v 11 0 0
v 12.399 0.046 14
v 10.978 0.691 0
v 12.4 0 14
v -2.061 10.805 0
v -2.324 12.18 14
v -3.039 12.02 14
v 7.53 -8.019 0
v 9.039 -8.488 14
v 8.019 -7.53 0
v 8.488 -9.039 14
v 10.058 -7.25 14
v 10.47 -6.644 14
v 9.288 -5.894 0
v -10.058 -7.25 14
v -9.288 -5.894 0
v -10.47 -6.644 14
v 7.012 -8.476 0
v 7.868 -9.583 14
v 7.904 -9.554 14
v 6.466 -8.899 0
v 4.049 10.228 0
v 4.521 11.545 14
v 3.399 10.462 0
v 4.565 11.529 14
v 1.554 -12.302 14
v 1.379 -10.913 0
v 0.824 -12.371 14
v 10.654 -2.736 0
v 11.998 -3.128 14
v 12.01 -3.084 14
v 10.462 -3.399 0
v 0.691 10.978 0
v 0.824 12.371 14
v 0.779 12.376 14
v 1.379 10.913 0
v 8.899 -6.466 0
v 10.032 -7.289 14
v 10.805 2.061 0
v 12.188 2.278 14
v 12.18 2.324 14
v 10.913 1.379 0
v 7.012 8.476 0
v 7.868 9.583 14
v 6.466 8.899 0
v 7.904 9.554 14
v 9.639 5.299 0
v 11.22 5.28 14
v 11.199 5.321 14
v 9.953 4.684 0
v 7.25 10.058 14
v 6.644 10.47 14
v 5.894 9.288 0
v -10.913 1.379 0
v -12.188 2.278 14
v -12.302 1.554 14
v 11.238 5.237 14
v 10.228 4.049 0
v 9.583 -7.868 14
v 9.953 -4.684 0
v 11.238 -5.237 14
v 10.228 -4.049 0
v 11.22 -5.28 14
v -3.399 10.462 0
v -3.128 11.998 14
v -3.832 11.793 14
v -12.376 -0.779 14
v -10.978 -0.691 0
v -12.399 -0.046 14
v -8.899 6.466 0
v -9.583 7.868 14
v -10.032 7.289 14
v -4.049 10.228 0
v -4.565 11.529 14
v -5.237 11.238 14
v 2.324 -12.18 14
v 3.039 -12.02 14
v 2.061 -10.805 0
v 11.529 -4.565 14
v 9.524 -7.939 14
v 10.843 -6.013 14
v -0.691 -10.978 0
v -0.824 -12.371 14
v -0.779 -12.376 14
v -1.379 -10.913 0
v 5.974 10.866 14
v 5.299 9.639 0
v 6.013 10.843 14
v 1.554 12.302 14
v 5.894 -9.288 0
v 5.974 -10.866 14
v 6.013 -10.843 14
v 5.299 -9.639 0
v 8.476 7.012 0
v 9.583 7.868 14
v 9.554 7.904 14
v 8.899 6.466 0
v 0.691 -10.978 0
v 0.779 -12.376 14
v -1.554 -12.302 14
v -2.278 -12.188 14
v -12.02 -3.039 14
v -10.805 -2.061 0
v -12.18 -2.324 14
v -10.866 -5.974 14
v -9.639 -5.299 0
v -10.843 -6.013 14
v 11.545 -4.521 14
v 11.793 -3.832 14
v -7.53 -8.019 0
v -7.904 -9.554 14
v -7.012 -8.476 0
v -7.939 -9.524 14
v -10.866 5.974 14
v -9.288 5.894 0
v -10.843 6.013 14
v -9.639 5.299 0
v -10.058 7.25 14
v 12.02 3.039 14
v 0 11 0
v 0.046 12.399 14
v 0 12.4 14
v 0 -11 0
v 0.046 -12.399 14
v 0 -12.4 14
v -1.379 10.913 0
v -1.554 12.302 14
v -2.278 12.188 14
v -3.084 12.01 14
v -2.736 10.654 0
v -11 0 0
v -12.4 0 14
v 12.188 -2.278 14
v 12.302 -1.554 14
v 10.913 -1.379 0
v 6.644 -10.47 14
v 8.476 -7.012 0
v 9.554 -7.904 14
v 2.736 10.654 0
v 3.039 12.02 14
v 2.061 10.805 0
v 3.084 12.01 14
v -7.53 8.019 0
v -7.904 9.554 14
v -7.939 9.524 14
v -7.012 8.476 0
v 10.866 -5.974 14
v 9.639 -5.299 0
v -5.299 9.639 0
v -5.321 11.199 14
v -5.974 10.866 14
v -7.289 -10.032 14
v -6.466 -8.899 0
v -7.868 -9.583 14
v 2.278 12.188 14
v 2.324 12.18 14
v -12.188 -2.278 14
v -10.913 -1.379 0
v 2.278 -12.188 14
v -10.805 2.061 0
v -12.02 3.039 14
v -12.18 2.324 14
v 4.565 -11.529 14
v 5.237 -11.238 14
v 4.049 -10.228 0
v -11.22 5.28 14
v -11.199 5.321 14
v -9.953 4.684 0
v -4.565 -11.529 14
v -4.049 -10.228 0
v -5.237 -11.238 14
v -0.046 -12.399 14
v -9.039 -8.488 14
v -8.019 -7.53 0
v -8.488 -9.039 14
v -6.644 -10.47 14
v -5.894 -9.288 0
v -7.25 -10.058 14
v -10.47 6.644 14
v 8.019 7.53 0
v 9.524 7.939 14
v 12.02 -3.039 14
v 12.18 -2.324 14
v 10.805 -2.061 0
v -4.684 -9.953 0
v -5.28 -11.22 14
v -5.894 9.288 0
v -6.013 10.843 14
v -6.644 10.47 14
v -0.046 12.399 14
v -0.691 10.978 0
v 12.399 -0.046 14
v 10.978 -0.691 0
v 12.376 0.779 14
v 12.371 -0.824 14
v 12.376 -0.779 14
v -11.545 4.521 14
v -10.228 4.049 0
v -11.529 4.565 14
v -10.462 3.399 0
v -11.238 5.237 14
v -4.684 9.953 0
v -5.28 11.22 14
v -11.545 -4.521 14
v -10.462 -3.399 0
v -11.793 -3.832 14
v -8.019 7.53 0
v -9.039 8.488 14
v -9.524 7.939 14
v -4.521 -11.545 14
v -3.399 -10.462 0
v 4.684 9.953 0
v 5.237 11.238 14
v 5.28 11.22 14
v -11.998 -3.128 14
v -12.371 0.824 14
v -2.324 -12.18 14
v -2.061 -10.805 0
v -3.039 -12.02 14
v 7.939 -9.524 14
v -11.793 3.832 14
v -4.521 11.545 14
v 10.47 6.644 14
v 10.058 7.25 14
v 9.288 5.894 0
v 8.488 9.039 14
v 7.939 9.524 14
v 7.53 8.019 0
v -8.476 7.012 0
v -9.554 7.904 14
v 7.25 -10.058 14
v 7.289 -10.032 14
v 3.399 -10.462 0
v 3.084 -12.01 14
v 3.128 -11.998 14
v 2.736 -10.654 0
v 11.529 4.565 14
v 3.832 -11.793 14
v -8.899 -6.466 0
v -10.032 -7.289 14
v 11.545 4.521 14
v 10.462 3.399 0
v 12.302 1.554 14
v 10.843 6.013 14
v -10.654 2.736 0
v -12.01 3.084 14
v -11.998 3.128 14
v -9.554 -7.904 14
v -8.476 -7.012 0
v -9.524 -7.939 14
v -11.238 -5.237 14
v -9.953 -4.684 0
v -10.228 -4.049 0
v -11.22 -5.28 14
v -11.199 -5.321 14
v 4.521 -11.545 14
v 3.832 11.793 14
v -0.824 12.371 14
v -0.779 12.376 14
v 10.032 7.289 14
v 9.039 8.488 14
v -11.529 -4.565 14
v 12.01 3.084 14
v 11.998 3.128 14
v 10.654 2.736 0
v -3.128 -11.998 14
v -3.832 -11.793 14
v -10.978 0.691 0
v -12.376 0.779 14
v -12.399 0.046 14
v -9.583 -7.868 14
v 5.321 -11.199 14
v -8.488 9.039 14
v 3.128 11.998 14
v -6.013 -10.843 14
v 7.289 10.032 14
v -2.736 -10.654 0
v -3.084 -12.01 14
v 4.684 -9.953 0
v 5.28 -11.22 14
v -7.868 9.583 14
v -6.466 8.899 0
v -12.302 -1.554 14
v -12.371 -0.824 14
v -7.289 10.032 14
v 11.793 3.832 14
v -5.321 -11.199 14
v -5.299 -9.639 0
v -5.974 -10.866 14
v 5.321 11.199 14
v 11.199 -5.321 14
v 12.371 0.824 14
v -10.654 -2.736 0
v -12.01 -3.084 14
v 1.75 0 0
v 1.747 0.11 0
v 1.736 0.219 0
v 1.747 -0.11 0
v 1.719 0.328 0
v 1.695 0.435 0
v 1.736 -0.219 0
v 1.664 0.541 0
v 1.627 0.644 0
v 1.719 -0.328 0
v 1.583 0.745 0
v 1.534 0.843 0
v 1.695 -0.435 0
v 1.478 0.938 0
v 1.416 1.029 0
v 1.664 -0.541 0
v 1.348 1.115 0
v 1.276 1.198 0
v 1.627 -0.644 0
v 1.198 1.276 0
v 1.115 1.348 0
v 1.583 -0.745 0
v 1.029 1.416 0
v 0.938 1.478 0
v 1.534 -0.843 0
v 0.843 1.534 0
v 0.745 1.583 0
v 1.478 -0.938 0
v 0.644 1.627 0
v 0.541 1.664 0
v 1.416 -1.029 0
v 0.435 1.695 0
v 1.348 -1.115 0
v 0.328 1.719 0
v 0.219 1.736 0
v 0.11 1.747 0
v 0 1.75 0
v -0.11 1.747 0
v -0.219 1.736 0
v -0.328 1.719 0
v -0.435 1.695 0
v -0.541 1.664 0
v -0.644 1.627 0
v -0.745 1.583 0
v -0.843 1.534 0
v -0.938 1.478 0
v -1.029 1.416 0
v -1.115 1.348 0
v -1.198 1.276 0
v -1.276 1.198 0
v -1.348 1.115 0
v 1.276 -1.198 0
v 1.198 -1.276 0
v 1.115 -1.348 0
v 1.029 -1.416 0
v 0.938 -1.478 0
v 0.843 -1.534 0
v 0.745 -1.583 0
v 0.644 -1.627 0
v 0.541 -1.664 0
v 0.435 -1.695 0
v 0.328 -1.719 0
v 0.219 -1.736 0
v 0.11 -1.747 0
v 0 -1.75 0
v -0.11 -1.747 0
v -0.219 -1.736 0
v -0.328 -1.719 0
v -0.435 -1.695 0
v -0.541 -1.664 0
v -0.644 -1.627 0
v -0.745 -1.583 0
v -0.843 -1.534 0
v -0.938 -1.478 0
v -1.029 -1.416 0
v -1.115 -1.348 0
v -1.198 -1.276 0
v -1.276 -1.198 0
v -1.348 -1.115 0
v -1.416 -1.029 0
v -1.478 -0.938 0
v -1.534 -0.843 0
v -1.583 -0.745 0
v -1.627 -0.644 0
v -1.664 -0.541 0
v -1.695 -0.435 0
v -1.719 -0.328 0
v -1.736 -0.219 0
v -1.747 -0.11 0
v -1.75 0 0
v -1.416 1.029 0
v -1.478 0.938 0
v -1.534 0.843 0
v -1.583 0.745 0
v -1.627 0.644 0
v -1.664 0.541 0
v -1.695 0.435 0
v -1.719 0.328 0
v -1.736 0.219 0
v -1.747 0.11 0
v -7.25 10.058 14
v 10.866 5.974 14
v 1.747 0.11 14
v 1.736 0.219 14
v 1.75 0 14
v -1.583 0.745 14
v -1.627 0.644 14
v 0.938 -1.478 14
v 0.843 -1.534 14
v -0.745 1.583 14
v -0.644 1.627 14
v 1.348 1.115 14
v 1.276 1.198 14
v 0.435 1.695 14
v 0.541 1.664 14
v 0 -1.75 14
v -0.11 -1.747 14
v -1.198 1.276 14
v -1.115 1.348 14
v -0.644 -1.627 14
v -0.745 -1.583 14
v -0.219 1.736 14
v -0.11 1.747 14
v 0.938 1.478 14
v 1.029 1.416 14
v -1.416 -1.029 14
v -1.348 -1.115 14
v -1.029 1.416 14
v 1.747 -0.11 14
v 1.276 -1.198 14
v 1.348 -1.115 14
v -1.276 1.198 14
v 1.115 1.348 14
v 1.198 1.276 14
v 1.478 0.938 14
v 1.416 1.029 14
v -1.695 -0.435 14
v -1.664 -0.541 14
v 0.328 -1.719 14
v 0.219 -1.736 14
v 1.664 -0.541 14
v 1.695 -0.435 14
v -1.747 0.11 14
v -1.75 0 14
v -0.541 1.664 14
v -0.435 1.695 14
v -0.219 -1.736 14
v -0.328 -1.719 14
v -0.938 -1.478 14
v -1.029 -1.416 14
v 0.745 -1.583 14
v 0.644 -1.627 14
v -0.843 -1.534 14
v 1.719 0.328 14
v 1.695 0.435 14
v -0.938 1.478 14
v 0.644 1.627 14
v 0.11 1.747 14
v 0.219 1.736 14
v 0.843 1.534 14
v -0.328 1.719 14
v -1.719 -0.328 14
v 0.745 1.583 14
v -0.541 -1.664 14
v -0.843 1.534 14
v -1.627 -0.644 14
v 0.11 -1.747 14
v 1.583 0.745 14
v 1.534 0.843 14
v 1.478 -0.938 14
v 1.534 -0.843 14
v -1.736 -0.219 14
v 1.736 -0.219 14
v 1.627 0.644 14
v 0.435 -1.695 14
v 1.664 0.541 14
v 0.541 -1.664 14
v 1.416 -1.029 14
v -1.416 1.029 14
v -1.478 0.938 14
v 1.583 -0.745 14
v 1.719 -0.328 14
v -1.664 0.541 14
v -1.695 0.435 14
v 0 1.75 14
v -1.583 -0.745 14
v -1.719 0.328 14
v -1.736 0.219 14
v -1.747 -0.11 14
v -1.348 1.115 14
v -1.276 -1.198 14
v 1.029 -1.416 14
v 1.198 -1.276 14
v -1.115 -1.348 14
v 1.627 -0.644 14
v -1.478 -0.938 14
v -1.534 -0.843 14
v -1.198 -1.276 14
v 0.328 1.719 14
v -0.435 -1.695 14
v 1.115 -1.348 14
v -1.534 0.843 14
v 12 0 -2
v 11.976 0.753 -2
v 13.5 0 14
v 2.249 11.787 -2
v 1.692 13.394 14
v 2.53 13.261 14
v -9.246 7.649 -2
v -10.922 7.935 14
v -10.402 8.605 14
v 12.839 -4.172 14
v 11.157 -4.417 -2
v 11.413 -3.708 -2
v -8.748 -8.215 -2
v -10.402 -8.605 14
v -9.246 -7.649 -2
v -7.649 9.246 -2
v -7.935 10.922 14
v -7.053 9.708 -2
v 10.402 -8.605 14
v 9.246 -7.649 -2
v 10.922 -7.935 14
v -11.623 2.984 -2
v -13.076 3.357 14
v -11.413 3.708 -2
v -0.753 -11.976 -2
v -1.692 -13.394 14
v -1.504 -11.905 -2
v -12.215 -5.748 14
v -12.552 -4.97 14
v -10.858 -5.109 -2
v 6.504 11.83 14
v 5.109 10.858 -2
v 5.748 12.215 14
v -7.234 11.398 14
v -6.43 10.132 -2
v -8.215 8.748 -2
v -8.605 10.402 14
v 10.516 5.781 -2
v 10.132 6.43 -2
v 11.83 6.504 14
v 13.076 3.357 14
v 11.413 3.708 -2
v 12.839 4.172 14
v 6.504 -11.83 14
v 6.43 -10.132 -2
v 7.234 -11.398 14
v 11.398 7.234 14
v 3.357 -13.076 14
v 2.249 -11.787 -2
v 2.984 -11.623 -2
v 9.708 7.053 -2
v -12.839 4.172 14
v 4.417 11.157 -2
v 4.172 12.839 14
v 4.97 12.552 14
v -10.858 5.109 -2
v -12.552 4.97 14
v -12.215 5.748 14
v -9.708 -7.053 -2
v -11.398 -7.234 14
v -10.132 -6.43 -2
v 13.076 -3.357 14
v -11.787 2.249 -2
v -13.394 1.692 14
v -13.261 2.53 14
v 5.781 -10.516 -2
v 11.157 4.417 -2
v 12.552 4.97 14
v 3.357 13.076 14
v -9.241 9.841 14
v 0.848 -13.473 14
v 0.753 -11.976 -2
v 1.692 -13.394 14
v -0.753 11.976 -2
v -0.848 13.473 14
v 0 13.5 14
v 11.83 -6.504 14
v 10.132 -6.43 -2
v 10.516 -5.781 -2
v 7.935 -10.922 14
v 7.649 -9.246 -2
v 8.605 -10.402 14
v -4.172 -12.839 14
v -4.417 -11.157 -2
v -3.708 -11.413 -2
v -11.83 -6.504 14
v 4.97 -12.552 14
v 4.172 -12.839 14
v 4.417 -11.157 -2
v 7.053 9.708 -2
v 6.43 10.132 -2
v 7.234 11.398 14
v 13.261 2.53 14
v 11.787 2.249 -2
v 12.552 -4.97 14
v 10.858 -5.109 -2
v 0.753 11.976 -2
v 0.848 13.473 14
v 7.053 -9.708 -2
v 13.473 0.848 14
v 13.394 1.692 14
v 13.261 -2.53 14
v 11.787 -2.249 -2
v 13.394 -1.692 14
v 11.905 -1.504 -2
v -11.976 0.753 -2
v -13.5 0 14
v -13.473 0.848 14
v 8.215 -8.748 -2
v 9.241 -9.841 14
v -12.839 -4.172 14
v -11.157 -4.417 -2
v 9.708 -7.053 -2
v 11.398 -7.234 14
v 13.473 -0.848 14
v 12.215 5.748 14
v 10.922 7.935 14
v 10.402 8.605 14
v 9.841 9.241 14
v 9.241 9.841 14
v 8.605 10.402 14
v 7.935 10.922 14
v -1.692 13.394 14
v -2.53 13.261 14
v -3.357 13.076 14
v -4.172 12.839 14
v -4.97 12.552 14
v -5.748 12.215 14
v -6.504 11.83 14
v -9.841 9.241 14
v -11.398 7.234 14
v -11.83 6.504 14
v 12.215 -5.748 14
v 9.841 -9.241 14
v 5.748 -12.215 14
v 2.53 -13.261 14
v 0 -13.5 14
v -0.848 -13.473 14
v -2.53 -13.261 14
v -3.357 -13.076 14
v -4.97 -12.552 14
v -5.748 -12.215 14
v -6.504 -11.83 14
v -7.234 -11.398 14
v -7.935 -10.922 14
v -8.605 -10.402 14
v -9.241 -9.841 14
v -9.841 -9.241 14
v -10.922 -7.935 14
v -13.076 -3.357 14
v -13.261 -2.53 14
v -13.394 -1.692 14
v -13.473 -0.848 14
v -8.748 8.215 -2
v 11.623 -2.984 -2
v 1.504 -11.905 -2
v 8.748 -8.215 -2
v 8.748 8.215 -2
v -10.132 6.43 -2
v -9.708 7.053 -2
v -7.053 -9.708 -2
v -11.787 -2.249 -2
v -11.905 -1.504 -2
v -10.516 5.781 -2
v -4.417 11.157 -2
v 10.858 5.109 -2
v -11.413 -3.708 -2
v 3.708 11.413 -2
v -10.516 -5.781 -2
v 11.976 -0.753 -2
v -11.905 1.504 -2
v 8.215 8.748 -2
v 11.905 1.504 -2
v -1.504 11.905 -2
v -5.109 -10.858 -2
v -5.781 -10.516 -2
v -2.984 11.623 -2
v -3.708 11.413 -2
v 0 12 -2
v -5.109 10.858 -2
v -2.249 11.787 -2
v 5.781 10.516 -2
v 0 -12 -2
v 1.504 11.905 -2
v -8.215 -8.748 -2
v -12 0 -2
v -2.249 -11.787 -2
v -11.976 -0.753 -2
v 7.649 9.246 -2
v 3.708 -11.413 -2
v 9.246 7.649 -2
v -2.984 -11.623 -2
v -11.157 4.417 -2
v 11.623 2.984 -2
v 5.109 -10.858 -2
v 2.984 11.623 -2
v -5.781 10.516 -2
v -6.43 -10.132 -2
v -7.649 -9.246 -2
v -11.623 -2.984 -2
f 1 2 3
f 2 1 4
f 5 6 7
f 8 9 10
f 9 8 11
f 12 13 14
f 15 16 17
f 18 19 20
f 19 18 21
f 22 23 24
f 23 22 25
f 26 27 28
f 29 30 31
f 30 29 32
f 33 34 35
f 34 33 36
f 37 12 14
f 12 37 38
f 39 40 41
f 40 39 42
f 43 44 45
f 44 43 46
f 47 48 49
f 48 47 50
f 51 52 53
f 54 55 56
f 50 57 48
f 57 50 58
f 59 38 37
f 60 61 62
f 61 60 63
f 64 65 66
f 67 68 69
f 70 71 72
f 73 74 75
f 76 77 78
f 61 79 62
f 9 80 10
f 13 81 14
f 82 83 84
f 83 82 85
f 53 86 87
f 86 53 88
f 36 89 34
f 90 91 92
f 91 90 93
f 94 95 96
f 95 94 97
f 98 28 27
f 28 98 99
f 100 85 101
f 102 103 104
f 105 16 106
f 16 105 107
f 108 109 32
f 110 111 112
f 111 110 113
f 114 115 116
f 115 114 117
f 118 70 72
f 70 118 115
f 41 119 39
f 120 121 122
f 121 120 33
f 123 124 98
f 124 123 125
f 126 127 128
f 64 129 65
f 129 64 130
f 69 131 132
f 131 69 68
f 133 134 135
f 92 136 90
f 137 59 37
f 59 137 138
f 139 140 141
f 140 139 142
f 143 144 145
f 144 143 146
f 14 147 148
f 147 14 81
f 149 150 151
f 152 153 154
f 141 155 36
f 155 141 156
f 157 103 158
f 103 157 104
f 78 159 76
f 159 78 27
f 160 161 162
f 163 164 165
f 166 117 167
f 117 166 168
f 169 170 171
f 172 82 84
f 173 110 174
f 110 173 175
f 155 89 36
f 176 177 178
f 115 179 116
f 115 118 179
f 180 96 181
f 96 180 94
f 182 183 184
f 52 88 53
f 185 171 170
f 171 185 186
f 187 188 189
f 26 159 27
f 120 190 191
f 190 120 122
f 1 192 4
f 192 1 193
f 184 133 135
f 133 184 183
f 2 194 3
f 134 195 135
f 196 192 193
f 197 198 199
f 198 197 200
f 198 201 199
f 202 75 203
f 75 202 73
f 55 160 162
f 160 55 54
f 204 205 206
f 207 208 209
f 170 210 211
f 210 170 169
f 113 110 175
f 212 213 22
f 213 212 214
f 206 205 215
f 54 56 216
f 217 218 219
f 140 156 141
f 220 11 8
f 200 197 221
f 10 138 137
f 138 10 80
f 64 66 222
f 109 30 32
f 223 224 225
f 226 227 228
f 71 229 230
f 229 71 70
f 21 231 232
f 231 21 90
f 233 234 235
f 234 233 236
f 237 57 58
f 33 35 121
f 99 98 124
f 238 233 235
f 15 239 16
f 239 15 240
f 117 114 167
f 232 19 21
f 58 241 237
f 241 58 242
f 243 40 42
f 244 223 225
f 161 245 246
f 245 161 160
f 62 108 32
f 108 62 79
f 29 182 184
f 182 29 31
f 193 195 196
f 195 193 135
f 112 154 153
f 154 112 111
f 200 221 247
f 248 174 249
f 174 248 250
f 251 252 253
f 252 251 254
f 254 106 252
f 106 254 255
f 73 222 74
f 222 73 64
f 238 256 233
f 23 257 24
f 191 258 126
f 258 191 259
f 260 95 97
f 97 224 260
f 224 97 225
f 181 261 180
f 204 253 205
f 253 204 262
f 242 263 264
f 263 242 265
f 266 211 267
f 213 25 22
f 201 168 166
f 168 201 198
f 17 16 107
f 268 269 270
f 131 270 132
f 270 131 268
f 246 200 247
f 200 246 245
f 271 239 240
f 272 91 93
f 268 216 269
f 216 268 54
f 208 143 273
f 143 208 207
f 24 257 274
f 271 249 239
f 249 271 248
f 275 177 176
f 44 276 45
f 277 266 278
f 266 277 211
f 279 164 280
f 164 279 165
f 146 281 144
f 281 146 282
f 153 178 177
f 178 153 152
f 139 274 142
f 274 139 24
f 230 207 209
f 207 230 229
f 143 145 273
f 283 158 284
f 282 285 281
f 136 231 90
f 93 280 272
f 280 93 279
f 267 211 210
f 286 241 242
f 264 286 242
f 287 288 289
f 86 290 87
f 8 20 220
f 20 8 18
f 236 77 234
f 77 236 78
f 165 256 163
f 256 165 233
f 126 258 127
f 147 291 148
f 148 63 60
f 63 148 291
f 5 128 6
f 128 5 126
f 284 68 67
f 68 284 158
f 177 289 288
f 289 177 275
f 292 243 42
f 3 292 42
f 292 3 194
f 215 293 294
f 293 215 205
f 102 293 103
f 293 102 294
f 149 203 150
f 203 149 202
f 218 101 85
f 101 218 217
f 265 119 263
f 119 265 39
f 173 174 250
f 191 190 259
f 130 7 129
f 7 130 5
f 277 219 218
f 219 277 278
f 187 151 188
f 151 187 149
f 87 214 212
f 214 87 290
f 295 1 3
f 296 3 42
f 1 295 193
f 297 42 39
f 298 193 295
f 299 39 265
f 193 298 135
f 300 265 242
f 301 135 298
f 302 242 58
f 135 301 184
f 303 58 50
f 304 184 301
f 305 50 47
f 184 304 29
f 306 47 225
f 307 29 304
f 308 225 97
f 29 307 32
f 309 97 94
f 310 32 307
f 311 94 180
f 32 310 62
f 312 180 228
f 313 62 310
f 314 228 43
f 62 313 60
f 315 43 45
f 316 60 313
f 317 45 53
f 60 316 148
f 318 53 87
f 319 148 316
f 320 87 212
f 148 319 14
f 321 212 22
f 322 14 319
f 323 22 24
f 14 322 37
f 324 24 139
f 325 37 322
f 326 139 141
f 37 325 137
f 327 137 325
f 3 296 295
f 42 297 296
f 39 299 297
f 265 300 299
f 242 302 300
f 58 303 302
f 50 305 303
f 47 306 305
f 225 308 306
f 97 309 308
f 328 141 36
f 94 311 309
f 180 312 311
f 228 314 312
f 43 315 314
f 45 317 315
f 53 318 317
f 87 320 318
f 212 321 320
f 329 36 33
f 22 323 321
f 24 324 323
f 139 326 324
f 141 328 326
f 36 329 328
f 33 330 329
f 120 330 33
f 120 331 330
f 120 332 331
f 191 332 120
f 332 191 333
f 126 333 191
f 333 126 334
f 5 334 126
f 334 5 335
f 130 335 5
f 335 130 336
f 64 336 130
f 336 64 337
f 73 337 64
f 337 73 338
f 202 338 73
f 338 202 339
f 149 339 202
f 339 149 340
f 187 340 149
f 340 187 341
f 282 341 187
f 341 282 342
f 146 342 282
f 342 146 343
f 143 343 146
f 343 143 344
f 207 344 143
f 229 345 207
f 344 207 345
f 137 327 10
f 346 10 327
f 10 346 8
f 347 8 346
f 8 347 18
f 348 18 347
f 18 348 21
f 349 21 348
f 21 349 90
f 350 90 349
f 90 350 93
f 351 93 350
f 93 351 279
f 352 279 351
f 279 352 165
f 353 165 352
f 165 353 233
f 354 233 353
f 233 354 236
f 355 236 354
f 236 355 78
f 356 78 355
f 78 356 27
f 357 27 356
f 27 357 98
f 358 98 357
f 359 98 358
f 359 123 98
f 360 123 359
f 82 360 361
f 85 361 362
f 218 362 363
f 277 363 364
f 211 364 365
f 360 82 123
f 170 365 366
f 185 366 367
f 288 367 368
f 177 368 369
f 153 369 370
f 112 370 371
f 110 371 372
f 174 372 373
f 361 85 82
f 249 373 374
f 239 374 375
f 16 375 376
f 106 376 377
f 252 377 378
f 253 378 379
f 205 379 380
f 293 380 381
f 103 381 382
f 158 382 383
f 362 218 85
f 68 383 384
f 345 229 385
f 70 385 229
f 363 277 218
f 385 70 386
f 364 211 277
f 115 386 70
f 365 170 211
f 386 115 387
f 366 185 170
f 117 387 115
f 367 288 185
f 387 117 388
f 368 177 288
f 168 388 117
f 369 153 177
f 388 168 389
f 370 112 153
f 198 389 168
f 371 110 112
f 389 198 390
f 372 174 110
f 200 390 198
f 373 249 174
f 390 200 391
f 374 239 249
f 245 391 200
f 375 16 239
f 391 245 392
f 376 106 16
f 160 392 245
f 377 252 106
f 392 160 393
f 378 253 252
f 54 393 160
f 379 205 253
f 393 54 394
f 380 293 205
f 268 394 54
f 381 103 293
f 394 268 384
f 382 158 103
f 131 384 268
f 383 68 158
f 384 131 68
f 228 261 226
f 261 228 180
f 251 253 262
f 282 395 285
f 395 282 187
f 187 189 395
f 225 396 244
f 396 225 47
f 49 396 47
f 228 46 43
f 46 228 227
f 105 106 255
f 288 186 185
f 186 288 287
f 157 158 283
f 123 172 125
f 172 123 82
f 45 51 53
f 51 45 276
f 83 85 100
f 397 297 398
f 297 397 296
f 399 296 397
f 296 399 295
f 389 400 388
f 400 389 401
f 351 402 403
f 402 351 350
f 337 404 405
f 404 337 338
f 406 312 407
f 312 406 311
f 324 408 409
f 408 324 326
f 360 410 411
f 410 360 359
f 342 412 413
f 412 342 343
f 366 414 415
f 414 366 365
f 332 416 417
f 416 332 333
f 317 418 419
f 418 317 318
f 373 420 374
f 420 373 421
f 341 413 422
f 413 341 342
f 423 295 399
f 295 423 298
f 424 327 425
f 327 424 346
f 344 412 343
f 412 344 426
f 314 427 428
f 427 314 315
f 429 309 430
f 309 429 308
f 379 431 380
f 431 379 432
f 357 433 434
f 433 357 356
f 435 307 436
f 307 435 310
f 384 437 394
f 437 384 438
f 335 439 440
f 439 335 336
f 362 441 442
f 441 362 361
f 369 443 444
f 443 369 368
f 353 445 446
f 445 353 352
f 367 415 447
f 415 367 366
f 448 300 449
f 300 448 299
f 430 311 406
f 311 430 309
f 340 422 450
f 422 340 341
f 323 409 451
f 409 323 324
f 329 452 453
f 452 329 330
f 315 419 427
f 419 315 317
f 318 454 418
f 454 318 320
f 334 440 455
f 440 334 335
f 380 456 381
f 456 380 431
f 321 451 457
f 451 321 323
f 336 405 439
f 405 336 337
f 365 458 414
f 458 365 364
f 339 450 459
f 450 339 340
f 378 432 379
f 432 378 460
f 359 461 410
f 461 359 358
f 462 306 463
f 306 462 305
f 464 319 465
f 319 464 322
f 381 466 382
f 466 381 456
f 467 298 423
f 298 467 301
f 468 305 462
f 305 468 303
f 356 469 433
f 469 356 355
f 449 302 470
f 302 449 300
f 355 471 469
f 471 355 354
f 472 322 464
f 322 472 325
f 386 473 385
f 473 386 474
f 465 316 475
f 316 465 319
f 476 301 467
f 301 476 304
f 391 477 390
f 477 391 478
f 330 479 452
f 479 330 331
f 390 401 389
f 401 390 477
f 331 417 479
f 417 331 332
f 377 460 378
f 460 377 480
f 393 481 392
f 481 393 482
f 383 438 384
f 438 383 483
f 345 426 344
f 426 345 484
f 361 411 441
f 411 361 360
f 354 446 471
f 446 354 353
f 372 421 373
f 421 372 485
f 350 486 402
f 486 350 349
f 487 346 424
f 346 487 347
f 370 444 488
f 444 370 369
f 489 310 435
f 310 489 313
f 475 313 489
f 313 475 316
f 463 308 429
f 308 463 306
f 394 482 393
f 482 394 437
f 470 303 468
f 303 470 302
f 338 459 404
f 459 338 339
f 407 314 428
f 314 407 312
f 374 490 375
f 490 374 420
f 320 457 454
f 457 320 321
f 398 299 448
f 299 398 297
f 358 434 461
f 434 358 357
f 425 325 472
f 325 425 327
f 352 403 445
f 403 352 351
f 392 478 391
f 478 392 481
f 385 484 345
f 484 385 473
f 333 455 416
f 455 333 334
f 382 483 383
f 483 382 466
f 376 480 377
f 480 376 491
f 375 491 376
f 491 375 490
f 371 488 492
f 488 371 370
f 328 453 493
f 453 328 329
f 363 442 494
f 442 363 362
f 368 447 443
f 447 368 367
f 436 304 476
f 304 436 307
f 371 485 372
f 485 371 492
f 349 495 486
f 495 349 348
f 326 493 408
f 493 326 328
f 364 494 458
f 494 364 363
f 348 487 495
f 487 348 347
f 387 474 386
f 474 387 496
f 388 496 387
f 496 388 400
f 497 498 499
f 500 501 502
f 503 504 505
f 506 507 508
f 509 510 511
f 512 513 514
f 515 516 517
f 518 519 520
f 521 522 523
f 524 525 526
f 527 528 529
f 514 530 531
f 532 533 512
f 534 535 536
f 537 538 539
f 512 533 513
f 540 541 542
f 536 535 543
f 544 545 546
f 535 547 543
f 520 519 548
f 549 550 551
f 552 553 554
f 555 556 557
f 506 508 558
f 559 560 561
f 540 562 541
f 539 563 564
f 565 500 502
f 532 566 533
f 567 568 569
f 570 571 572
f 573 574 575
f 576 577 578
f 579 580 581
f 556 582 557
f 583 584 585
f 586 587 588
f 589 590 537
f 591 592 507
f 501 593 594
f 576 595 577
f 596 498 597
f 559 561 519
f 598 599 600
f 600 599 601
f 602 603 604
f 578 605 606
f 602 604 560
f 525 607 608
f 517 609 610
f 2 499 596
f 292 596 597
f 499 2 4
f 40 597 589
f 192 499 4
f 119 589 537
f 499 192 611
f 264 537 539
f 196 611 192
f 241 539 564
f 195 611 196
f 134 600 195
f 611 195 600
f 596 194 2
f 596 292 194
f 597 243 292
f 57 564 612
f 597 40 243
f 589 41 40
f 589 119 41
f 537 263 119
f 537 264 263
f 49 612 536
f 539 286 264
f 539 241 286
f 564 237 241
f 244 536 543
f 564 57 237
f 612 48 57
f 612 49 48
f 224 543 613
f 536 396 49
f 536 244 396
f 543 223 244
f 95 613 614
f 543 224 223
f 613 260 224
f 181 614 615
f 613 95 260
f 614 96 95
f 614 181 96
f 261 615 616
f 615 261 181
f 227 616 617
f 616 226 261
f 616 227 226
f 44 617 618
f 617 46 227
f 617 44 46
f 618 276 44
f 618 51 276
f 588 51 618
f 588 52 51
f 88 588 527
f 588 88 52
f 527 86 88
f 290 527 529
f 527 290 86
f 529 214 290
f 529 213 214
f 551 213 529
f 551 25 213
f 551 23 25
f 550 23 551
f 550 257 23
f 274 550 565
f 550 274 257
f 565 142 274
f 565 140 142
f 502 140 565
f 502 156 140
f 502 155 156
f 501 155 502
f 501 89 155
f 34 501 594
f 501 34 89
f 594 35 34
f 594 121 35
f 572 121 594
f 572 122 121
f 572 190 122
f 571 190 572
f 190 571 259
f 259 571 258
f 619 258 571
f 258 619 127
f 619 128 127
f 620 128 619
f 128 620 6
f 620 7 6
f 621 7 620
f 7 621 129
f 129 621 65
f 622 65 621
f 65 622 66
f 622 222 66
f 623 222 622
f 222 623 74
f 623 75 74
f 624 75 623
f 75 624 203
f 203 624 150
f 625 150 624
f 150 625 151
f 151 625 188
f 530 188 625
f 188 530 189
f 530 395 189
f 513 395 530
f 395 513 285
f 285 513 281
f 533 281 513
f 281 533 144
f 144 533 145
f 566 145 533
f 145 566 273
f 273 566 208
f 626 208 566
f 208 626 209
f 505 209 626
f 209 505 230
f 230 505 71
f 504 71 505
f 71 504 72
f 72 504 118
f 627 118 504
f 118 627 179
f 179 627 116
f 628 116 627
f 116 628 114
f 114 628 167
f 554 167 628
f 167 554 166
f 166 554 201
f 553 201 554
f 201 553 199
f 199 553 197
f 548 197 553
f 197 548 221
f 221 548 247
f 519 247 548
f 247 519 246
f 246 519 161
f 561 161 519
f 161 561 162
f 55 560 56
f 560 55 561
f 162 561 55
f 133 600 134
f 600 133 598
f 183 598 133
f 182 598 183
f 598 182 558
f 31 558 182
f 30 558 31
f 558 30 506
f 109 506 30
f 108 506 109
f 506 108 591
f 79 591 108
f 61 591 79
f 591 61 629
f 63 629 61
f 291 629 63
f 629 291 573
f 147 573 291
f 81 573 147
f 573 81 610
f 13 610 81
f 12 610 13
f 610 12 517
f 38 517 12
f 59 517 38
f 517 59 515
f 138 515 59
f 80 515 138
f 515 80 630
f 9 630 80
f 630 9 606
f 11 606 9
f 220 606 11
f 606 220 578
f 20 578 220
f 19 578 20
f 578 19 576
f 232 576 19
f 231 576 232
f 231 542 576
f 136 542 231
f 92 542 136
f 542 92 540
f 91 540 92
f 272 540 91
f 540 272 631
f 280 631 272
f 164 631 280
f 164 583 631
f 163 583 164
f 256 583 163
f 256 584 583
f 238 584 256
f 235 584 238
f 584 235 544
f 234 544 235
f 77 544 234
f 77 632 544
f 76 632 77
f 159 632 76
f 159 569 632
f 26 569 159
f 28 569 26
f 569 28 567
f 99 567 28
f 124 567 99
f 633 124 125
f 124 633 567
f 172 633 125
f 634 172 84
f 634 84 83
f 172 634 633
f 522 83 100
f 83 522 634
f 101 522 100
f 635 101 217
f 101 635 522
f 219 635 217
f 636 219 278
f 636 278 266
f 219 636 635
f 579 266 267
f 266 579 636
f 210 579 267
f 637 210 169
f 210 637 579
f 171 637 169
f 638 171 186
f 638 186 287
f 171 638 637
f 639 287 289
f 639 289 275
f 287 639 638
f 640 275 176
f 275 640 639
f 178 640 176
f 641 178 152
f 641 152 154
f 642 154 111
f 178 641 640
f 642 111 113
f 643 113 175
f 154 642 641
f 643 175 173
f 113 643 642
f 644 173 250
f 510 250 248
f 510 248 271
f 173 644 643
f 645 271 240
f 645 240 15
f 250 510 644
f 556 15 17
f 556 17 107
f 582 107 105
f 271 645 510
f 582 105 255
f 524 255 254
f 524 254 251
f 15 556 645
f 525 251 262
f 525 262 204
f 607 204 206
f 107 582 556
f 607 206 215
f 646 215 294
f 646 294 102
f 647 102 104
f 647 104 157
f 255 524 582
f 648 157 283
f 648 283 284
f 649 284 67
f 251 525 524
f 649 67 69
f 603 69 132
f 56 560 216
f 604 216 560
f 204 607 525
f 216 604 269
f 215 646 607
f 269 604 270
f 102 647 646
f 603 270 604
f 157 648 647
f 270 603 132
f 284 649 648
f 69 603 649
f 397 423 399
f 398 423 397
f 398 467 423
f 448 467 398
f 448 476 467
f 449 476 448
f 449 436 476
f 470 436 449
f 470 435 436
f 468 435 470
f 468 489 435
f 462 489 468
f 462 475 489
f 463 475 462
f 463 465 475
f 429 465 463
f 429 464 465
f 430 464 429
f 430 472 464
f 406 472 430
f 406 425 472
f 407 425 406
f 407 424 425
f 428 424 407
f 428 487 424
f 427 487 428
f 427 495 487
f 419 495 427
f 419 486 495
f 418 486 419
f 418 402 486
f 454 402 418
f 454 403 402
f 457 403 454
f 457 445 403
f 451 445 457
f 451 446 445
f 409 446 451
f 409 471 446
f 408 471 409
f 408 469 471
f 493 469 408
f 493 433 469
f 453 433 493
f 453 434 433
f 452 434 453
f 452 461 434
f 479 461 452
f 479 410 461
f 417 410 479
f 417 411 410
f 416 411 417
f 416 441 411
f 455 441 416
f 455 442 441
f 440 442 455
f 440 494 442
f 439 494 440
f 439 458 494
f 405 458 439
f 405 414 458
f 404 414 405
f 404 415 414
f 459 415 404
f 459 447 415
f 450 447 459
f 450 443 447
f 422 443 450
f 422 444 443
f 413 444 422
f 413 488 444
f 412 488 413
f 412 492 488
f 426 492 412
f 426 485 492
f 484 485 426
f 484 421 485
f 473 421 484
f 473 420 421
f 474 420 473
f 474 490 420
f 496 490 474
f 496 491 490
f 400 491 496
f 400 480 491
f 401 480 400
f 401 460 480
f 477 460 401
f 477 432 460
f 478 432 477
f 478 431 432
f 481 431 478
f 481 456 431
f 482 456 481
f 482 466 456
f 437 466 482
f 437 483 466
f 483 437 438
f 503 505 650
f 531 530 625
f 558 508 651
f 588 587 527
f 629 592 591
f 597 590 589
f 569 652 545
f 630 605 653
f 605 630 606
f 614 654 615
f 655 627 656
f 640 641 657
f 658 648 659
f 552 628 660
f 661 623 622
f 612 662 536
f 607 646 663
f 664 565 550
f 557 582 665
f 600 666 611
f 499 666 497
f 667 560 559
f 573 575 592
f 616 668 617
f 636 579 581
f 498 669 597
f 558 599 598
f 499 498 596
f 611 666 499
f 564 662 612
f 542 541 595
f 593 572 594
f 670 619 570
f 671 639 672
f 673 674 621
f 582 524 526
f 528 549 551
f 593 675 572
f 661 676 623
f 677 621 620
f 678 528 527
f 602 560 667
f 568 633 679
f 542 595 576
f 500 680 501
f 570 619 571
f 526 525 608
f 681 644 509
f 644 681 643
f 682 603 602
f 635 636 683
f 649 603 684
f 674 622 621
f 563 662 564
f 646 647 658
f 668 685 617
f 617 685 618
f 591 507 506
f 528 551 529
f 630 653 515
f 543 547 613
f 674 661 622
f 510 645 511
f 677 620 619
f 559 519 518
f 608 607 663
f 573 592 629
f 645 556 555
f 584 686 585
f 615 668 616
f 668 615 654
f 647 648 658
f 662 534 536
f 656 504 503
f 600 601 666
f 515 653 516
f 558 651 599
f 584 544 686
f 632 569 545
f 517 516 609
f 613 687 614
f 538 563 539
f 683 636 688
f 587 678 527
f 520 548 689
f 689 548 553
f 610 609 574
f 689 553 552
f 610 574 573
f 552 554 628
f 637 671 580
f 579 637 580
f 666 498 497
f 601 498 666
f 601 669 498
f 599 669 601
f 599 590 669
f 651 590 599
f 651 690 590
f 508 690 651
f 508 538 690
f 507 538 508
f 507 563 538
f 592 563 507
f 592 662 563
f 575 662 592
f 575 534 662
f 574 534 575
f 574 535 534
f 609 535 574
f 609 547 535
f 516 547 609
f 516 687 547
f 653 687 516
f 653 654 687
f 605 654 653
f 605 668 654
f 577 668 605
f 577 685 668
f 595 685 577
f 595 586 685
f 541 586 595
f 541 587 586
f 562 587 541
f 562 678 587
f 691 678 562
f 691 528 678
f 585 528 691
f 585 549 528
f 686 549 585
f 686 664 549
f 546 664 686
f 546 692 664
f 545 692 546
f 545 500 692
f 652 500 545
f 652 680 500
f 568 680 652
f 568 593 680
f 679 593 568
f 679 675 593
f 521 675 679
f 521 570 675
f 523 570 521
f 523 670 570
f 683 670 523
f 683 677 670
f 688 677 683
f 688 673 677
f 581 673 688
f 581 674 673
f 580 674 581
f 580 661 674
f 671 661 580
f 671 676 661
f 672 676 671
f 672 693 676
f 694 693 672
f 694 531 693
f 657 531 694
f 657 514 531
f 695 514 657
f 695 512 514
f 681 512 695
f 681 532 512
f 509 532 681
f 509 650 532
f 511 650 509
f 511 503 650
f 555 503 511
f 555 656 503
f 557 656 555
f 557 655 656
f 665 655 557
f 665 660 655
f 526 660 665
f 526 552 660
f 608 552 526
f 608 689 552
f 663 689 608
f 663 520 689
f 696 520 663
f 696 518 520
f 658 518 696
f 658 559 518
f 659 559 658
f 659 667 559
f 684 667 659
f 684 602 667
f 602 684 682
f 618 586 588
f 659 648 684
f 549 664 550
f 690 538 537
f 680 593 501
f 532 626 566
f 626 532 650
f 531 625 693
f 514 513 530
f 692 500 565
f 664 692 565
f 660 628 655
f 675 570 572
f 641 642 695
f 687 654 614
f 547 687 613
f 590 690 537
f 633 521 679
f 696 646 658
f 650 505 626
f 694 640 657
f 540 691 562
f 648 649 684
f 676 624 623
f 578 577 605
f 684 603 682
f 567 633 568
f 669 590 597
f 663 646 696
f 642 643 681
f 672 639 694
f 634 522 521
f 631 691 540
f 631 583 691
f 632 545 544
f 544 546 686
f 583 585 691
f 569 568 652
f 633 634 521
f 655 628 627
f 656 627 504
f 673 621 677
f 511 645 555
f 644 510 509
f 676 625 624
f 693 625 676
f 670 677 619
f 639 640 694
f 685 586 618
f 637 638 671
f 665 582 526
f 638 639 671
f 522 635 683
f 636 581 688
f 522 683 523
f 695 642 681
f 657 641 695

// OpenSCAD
$fn = 100;

module taper_plug(taper_small = 22 / 2, taper_large = 25 / 2, height = 8, hole = 3.5 / 2) {
    difference() {
        cylinder(r1 = taper_small, r2 = taper_large, h = height, $fn = $fn);
        cylinder(r = hole, h = height, $fn = $fn);
        }
}

module taper_plug_mould(taper_small = 22 / 2, taper_large = 25 / 2, height = 8, hole = 3.5 / 2, thickness = 2) {
    difference() {
        translate([0, 0, -2]) cylinder(r1 = taper_small + thickness, r2 = taper_large + thickness, h = height + thickness);
            
        taper_plug(taper_small = taper_small, taper_large = taper_large, height = height, hole = hole);
    }
}

taper_plug_mould(height = 15, thickness = 1);
//taper_plug(height = 15);
